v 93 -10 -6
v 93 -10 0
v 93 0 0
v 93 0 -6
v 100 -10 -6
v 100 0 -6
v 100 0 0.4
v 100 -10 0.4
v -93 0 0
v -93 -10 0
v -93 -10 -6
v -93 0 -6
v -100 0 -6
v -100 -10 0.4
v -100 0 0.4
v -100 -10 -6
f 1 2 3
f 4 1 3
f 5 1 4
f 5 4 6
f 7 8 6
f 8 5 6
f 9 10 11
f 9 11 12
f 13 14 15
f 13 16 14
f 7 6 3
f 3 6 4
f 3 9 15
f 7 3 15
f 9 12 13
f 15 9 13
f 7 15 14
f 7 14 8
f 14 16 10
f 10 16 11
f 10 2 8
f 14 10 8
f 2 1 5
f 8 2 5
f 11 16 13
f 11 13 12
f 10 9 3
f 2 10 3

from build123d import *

# Parameters (mm, degrees)
F0_W     = 7
F0_H     = 10
F1_DEPTH = 6
F0_W_2   = 186
F2_DEPTH = 0.4


with BuildPart() as f1:
    # F0 (on Top) → F1 (new body)
    with BuildSketch(Plane.XY):
        with Locations((-96.5, -5)):
            Rectangle(F0_W, F0_H)
    extrude(amount=-F1_DEPTH)



with BuildPart() as f1b:
    # F0 (on Top) → F1, piece 2 (new body)
    with BuildSketch(Plane.XY):
        with Locations((96.5, -5)):
            Rectangle(F0_W, F0_H)
    extrude(amount=-F1_DEPTH)


with BuildPart() as f1_1:
    add(f1.part)

    add(f1b.part)  # F2 merges F1b
    # F0 (on Top) → F2 (join)
    with BuildSketch(Plane.XY):
        with Locations((-96.5, -5)):
            Rectangle(F0_W, F0_H)
        with Locations((0, -5)):
            Rectangle(F0_W_2, F0_H)
        with Locations((96.5, -5)):
            Rectangle(F0_W, F0_H)
    extrude(amount=F2_DEPTH)


solid = f1_1.part
